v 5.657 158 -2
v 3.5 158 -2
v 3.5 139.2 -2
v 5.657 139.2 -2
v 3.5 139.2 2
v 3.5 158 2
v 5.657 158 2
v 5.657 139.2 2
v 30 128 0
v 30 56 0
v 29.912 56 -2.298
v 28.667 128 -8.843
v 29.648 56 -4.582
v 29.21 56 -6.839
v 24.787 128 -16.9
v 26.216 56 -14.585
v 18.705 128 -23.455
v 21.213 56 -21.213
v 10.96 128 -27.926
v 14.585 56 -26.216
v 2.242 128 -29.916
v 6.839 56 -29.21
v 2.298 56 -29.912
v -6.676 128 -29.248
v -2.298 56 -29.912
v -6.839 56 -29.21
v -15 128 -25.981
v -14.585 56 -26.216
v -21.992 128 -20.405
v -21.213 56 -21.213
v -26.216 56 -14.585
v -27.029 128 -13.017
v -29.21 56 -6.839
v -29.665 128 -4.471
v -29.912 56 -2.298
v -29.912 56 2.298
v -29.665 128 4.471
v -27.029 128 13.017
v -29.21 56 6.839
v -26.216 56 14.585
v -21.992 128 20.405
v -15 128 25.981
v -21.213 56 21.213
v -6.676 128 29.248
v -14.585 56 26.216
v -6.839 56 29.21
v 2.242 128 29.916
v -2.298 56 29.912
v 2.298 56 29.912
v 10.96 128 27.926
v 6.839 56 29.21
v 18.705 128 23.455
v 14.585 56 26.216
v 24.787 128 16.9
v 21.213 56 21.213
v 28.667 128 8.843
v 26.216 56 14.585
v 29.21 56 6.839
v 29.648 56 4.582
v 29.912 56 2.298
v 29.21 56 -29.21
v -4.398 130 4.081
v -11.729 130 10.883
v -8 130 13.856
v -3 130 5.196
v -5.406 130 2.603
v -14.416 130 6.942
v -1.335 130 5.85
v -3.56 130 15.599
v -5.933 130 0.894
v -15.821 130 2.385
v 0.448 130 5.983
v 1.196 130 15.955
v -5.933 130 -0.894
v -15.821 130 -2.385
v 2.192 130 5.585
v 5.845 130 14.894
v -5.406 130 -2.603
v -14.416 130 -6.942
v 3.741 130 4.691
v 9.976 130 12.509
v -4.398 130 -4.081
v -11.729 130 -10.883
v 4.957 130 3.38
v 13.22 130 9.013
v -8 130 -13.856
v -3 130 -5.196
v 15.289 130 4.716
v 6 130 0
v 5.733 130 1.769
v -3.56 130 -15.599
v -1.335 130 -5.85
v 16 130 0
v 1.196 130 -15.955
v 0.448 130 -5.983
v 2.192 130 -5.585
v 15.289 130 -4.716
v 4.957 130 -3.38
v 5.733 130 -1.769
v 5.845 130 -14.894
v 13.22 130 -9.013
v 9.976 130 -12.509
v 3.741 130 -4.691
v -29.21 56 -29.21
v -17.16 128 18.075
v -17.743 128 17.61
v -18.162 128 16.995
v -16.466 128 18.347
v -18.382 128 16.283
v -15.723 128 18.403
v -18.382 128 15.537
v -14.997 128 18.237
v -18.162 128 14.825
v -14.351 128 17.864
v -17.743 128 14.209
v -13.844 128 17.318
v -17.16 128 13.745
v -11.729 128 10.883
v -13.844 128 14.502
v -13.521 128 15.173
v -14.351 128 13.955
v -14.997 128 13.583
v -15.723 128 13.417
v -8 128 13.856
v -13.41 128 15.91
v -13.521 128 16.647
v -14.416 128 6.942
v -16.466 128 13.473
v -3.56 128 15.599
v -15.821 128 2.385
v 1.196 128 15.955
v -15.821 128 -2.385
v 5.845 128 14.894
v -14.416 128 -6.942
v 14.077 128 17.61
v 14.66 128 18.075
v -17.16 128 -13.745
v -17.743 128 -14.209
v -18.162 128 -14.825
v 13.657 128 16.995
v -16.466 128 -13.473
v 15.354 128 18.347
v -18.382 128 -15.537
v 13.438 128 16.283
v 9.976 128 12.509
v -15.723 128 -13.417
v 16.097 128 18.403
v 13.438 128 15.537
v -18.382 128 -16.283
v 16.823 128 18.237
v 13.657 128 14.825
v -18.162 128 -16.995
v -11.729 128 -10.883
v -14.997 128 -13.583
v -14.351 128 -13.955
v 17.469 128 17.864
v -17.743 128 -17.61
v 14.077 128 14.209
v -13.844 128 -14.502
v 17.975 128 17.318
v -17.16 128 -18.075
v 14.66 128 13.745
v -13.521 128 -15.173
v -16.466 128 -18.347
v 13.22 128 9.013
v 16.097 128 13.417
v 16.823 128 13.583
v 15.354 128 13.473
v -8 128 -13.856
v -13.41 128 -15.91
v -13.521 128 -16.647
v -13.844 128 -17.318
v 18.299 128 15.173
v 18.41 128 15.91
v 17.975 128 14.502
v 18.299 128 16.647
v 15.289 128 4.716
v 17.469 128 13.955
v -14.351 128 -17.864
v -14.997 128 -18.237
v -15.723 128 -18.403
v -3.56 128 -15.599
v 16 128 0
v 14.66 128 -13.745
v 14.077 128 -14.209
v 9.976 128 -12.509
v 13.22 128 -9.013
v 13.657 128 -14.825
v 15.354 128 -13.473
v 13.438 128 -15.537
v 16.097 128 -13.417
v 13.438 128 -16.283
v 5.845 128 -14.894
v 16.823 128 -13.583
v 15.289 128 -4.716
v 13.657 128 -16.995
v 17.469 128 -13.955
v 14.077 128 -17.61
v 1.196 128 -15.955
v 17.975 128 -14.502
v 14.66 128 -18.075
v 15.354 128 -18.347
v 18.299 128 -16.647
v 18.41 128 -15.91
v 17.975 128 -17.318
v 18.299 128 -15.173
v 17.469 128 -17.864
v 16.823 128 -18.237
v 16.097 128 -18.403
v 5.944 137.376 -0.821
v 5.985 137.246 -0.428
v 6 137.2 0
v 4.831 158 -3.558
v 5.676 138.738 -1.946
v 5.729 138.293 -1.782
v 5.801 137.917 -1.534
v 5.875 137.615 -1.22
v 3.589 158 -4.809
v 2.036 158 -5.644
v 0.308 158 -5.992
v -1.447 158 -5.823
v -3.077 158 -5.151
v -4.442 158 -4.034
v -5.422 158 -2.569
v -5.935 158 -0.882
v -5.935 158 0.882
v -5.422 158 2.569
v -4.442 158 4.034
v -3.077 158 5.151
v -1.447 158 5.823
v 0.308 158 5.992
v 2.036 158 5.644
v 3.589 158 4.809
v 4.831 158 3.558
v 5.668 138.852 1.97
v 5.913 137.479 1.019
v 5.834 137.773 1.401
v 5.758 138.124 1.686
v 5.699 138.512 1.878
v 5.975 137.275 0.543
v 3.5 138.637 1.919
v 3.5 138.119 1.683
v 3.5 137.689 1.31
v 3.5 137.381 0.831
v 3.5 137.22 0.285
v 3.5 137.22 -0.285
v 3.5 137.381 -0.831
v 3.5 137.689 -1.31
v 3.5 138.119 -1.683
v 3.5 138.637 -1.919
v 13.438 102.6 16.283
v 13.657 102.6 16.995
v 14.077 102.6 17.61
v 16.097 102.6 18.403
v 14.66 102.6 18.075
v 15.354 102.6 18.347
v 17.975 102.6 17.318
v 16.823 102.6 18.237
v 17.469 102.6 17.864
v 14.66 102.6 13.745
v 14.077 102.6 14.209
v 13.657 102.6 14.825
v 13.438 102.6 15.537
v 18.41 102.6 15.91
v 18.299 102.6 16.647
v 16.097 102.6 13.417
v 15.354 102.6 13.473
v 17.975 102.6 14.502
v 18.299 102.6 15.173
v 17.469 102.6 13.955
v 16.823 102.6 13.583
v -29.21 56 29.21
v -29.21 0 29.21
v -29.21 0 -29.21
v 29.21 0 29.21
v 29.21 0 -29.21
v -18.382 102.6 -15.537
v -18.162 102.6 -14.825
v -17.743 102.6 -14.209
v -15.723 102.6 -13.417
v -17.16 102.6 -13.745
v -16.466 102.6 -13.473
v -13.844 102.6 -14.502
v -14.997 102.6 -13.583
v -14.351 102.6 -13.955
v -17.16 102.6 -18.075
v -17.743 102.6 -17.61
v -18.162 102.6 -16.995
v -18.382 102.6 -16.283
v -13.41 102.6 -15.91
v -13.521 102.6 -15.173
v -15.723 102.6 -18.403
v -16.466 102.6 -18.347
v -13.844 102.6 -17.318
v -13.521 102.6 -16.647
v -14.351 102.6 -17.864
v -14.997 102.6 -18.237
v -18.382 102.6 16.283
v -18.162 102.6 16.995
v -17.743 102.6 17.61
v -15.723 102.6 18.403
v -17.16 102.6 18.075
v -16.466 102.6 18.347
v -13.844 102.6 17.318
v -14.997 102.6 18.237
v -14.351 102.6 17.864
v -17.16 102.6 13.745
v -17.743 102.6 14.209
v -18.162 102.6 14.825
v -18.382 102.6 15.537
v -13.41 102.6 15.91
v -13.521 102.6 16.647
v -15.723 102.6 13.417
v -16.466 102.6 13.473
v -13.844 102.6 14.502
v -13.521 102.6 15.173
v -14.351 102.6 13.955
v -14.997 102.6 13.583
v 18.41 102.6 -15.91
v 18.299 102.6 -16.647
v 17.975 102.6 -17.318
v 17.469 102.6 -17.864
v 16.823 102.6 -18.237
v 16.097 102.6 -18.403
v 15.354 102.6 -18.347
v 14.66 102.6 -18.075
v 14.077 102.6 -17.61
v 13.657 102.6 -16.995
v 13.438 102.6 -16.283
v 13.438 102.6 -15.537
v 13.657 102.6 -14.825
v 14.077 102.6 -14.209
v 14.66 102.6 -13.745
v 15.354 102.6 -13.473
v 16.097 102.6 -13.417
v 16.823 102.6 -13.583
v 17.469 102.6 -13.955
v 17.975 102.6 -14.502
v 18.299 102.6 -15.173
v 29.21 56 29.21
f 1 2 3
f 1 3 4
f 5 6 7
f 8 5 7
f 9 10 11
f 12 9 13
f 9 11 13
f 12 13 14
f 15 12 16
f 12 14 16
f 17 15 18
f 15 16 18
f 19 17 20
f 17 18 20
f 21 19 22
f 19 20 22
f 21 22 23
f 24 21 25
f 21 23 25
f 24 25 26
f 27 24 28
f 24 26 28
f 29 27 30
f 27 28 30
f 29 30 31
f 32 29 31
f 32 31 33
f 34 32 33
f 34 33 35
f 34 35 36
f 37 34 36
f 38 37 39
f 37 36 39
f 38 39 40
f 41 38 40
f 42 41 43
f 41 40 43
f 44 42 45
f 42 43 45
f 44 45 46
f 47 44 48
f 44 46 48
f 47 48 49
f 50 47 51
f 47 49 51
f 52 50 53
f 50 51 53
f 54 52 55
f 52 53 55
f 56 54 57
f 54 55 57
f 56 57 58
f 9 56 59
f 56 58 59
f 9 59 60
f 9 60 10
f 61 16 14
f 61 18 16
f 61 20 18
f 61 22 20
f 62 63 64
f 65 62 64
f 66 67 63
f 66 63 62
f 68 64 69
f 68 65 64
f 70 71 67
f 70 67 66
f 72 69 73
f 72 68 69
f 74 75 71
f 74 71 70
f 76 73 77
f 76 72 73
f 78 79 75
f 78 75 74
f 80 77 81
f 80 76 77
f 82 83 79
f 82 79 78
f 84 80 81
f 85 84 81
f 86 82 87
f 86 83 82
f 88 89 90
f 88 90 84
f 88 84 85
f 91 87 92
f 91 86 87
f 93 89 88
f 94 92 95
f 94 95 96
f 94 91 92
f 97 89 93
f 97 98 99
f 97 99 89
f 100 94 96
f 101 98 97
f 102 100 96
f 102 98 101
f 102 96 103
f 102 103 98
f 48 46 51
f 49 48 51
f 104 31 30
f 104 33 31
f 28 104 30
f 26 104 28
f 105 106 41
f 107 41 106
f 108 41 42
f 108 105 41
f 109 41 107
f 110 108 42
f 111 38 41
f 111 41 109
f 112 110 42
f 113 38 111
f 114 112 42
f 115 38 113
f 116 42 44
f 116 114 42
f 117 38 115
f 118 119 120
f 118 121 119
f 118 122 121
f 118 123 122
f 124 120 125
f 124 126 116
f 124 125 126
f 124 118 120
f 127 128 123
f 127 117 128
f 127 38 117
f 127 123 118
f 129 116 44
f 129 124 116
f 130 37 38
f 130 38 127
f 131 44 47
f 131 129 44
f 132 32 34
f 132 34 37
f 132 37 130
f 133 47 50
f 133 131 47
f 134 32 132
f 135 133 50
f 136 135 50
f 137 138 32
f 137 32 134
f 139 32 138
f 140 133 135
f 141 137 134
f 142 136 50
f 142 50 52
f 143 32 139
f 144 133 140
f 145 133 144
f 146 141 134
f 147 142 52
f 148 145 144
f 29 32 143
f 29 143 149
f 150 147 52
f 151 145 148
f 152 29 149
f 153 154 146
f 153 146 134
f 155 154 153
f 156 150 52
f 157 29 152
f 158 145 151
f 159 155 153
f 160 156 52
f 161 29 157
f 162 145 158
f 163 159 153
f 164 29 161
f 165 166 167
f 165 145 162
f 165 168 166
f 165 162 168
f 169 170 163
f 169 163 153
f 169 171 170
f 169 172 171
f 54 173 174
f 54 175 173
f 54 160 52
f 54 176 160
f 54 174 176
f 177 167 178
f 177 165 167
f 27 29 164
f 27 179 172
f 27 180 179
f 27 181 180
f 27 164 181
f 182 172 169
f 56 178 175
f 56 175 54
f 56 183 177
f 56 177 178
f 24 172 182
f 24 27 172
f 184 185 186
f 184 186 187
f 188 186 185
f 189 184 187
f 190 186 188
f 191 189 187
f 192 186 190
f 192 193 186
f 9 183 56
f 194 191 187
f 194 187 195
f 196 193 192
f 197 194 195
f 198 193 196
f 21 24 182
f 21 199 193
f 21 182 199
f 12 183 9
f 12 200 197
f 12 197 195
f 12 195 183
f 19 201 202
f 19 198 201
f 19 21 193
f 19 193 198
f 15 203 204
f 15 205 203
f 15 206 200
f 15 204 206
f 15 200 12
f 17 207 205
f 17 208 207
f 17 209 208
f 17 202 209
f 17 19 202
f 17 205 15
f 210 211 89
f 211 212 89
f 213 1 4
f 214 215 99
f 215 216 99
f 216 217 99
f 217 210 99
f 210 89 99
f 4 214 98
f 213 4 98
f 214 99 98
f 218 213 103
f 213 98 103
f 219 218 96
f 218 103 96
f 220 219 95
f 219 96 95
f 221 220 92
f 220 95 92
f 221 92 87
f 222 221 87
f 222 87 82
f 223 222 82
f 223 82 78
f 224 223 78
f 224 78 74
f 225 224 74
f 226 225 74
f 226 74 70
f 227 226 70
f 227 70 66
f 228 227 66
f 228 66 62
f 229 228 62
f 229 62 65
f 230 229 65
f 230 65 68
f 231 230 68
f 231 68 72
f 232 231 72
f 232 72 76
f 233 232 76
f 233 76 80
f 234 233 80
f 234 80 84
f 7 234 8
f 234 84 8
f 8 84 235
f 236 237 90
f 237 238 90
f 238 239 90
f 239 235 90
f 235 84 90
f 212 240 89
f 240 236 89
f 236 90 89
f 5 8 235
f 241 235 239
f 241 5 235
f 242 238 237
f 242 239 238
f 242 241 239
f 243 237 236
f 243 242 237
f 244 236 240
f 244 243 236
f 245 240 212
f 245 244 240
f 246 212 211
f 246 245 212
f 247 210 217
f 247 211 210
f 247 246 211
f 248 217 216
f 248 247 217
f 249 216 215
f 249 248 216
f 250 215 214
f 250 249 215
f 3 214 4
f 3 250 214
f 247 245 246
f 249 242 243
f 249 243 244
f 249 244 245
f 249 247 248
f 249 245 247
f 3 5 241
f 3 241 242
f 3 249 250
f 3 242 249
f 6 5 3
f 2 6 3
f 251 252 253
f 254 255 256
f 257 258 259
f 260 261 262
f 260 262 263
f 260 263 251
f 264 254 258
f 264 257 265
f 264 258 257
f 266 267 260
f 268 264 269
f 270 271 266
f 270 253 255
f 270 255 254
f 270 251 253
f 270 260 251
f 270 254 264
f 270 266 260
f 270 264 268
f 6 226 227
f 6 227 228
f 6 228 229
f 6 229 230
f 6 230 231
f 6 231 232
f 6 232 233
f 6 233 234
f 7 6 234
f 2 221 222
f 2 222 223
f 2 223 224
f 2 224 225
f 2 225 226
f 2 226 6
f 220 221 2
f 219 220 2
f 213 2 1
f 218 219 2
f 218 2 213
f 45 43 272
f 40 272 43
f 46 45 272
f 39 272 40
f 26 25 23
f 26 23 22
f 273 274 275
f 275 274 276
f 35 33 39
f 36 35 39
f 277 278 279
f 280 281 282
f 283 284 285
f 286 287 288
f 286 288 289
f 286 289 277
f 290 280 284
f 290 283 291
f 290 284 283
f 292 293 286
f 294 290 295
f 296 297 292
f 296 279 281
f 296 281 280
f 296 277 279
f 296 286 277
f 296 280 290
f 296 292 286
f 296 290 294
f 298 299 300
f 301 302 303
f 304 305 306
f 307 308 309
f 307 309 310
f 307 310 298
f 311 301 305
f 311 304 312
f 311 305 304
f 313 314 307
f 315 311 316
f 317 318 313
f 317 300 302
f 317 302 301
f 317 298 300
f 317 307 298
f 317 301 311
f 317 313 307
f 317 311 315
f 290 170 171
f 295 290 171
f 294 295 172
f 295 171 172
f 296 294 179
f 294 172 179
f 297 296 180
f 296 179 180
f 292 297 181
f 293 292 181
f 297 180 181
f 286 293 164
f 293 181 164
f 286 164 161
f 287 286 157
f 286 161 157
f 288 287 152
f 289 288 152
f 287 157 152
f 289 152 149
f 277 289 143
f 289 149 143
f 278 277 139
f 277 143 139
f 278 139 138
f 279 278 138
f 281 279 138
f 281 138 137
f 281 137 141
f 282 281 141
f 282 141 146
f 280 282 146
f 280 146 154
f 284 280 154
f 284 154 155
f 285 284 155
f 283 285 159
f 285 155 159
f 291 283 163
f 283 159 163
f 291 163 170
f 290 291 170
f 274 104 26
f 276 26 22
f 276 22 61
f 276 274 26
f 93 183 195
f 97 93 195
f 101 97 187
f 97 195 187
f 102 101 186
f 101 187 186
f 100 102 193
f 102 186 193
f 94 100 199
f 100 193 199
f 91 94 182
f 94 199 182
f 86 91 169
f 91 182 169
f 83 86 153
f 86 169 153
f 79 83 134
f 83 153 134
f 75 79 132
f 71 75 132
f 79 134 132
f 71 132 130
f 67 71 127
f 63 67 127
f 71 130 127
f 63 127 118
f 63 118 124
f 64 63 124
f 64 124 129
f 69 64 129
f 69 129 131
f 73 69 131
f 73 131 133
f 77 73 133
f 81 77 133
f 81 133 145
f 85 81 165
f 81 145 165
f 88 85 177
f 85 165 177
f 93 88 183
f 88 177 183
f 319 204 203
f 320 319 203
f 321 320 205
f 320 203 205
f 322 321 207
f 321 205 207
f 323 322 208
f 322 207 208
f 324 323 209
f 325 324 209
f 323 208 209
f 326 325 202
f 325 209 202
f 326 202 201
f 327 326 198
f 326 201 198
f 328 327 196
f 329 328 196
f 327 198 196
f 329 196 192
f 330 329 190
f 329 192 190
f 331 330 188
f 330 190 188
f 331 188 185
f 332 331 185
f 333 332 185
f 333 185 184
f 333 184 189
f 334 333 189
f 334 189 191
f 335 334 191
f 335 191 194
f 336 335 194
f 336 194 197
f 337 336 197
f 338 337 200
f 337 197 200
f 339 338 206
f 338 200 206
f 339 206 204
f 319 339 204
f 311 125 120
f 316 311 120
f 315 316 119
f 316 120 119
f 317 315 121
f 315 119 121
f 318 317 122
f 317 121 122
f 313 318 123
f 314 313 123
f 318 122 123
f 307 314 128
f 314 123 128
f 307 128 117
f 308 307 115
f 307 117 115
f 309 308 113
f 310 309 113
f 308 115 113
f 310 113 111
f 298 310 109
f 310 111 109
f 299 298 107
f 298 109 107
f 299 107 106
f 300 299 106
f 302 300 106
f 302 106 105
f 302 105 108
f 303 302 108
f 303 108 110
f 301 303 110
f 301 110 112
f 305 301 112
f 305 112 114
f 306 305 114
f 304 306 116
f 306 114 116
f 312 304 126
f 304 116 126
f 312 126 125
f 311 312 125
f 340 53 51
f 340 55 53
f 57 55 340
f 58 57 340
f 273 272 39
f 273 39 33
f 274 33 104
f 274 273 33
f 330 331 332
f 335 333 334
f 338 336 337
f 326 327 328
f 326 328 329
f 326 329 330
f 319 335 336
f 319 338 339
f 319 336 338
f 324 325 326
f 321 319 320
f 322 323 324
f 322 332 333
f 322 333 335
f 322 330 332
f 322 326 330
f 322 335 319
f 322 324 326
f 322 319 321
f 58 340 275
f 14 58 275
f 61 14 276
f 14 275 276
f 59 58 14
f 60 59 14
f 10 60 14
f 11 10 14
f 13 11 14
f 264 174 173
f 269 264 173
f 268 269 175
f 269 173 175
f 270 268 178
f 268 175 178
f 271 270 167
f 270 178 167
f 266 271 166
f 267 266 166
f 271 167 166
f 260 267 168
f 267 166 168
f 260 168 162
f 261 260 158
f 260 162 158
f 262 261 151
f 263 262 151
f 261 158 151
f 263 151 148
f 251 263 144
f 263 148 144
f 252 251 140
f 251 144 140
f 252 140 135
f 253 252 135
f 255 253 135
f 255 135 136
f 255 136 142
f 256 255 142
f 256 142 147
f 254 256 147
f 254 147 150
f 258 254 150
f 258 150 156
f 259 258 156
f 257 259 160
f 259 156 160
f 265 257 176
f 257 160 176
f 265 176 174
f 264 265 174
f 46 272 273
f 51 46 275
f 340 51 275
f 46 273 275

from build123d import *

# Parameters (mm, degrees)
SKETCH1_W           = 58.42
SKETCH1_H           = 58.42
BOSS_EXTRUDE1_DEPTH = 56
SKETCH2_R           = 30
BOSS_EXTRUDE2_DEPTH = 72
SKETCH3_R           = 6
BOSS_EXTRUDE3_DEPTH = 30
SKETCH4_R           = 2.5
CUT_EXTRUDE1_DEPTH  = 25.4
SKETCH5_W           = 2.5
SKETCH5_H           = 4
CUT_EXTRUDE2_DEPTH  = 18.8
SKETCH6_R           = 16
BOSS_EXTRUDE4_DEPTH = 2
CUT_EXTRUDE3_REACH  = 28.5


with BuildPart() as part:
    # Sketch1 → Boss-Extrude1 (new body)
    with BuildSketch(Plane(origin=(0, 0, 0), x_dir=(1, 0, 0), z_dir=(0, 1, 0))):
        Rectangle(SKETCH1_W, SKETCH1_H)
    extrude(amount=BOSS_EXTRUDE1_DEPTH)

    # Sketch2 → Boss-Extrude2 (add)
    with BuildSketch(Plane(origin=(0, 56, 0), x_dir=(1, 0, 0), z_dir=(0, 1, 0))):
        Circle(SKETCH2_R)
    extrude(amount=BOSS_EXTRUDE2_DEPTH)

    # Sketch3 → Boss-Extrude3 (add)
    with BuildSketch(Plane(origin=(0, 128, 0), x_dir=(1, 0, 0), z_dir=(0, 1, 0))):
        Circle(SKETCH3_R)
    extrude(amount=BOSS_EXTRUDE3_DEPTH)

    # Sketch4 → Cut-Extrude1 (cut)
    with BuildSketch(Plane(origin=(0, 128, 0), x_dir=(1, 0, 0), z_dir=(0, 1, 0))):
        with Locations((-15.909902577, 15.909902577)):
            Circle(SKETCH4_R)
        with Locations((15.909902577, 15.909902577)):
            Circle(SKETCH4_R)
        with Locations((15.909902577, -15.909902577)):
            Circle(SKETCH4_R)
        with Locations((-15.909902577, -15.909902577)):
            Circle(SKETCH4_R)
    extrude(amount=-CUT_EXTRUDE1_DEPTH, mode=Mode.SUBTRACT)

    # Sketch5 → Cut-Extrude2 (cut)
    with BuildSketch(Plane(origin=(0, 158, 0), x_dir=(1, 0, 0), z_dir=(0, 1, 0))):
        with Locations((4.75, 0)):
            Rectangle(SKETCH5_W, SKETCH5_H)
    extrude(amount=-CUT_EXTRUDE2_DEPTH, mode=Mode.SUBTRACT)

    # Sketch6 → Boss-Extrude4 (add)
    with BuildSketch(Plane(origin=(0, 128, 0), x_dir=(1, 0, 0), z_dir=(0, 1, 0))):
        Circle(SKETCH6_R)
    extrude(amount=BOSS_EXTRUDE4_DEPTH)

    # Sketch7 → Cut-Extrude3 (cut, up to next)
    with BuildSketch(Plane(origin=(3.5, 0, 0), x_dir=(0, 0, -1), z_dir=(1, 0, 0)), mode=Mode.PRIVATE) as cut_extrude3_sk1:
        with BuildLine():
            Line((2, 139.2), (-2, 139.2))
            ThreePointArc((-2, 139.2), (0, 137.2), (2, 139.2))
        make_face()
    cut_extrude3_tool1 = extrude(cut_extrude3_sk1.sketch, amount=CUT_EXTRUDE3_REACH, mode=Mode.PRIVATE) & part.part
    add(cut_extrude3_tool1.solids().sort_by_distance((3.5, 138.351174, 0))[0], mode=Mode.SUBTRACT)


solid = part.part
